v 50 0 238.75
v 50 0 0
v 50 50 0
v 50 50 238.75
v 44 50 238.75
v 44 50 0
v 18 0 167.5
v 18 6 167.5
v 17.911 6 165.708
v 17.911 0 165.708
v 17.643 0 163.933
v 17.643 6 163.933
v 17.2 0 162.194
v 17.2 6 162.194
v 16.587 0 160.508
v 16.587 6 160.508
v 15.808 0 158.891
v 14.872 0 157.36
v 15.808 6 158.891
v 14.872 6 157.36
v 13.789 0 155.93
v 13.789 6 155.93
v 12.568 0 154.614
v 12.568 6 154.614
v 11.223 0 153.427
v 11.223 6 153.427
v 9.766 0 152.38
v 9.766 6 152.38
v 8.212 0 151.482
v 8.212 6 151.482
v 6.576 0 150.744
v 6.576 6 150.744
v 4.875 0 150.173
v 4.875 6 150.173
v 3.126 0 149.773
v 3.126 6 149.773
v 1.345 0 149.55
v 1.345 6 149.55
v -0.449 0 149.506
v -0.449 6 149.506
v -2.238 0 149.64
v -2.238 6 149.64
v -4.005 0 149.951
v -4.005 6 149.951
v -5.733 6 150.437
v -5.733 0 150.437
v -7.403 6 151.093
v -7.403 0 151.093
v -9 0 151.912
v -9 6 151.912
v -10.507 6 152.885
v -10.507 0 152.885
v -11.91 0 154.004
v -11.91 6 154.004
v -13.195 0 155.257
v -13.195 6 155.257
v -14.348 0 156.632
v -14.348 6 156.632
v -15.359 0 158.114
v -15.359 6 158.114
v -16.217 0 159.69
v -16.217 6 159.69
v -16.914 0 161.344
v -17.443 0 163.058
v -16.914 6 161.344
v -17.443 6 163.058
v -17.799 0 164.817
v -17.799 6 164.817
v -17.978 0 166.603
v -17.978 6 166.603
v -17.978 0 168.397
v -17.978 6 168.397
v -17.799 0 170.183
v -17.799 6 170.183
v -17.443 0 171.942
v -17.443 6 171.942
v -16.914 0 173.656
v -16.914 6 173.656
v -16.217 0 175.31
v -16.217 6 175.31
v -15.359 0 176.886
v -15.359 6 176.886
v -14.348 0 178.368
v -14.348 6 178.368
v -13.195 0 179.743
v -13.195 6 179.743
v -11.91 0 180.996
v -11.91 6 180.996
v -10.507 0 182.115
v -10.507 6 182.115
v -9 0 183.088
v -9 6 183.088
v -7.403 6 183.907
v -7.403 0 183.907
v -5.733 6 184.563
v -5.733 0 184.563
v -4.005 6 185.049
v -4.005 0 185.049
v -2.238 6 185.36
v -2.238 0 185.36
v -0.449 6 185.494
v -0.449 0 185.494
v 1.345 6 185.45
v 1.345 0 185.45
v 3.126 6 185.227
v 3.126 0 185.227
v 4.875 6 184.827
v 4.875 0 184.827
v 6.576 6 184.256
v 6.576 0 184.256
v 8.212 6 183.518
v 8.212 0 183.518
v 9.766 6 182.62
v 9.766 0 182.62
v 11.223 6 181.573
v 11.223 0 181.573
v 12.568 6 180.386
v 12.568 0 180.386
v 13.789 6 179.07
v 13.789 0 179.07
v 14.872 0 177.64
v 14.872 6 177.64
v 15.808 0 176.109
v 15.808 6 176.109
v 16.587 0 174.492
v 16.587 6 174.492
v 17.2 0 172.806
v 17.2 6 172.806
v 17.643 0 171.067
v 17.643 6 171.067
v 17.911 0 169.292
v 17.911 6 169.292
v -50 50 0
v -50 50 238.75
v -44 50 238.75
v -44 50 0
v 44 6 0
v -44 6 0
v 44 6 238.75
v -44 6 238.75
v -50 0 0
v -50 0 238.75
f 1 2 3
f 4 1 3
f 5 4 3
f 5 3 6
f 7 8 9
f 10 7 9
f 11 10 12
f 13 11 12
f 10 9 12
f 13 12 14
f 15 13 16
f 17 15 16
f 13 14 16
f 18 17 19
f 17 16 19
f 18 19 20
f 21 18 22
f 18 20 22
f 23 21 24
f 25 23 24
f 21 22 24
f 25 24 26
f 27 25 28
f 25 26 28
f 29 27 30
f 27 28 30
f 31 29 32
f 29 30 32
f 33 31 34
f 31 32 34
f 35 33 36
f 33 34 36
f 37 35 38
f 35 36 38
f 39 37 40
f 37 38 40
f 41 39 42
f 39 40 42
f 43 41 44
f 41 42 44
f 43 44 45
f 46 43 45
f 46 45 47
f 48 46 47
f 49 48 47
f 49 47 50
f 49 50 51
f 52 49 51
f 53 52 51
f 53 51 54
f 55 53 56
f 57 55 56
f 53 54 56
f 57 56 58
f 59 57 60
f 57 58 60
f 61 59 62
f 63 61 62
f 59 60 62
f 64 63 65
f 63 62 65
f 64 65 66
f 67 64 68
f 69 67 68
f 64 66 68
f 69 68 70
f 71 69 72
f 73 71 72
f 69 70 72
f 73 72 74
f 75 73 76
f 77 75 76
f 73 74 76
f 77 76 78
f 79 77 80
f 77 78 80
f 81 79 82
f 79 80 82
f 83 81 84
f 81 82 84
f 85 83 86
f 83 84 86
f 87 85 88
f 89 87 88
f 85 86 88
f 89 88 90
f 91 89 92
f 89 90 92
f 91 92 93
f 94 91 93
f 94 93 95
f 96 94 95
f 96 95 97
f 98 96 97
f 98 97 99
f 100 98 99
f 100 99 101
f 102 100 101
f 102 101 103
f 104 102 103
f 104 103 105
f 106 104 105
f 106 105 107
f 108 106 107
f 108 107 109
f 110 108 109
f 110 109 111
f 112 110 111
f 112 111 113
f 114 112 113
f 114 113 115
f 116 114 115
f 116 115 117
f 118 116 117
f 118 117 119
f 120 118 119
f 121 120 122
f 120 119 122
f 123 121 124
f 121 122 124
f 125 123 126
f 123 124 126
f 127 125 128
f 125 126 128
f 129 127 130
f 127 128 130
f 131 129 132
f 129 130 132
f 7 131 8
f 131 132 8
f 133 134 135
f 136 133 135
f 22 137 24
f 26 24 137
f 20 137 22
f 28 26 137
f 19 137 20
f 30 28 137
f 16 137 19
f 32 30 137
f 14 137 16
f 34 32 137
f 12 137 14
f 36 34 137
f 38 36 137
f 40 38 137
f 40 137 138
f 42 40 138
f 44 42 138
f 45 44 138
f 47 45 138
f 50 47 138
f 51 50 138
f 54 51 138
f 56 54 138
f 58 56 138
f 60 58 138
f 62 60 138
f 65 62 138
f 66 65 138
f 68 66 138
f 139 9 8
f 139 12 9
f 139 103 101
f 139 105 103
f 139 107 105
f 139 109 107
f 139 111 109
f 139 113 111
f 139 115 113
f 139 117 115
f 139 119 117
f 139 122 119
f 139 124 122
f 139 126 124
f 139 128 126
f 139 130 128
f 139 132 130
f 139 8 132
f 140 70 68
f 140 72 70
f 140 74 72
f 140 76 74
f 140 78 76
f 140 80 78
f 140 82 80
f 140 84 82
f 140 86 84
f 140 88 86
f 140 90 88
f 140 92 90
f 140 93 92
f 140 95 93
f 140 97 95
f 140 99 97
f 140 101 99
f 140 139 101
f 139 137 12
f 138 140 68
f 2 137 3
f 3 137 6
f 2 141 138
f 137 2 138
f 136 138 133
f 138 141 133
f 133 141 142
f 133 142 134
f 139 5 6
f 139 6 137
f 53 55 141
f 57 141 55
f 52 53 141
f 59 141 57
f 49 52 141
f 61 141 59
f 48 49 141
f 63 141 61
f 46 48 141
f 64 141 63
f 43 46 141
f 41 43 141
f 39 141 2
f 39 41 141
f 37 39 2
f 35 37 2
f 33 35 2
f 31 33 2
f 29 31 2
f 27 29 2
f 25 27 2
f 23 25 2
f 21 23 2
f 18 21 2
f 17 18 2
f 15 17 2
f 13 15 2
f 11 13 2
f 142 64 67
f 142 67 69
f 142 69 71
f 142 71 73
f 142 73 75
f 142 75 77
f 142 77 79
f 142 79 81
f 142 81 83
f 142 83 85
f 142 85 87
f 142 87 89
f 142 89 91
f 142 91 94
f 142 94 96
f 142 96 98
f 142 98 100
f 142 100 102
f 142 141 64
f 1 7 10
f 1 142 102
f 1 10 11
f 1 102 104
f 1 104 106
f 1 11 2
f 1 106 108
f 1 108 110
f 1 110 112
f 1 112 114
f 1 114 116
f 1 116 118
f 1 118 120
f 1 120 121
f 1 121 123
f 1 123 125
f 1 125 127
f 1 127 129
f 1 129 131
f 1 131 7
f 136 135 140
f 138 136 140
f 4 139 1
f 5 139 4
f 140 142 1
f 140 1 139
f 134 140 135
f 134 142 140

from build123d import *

# Parameters (mm, degrees)
PAD_DEPTH            = 238.75
SKETCH001_R          = 18
POCKET_DEPTH         = 6
BODY_ROLL_ANGLE      = 180
BODY_PLACEMENT_ANGLE = 90


with BuildPart() as part:
    # Sketch → Pad (new body)
    with BuildSketch(Plane.XY):
        Polygon((0, 50), (0, 0), (50, 0), (50, 6), (6, 6), (6, 50), align=None)
    pad = extrude(amount=PAD_DEPTH)

    # Mirrored: Pad across face of Pad
    add(pad.mirror(Plane(origin=(3, 50, 119.375), x_dir=(-1, 0, 0), z_dir=(0, 1, 0))))

    # Sketch001 (on Face5 of Pad) → Pocket (cut)
    with BuildSketch(Plane.YZ.offset(6)):
        with Locations((50, 71.25)):
            Circle(SKETCH001_R)
    extrude(amount=-POCKET_DEPTH, mode=Mode.SUBTRACT)


with BuildPart() as part_1:
    # Body roll: moved
    add(part.part.rotate(Axis((0, 0, 0), (1, 0, 0)), BODY_ROLL_ANGLE))


with BuildPart() as part_2:
    # Body placement: moved
    add(part_1.part.moved(Location((-50, 0, 238.75))).rotate(Axis((-50, 0, 238.75), (0, 0, 1)), BODY_PLACEMENT_ANGLE))


solid = part_2.part
